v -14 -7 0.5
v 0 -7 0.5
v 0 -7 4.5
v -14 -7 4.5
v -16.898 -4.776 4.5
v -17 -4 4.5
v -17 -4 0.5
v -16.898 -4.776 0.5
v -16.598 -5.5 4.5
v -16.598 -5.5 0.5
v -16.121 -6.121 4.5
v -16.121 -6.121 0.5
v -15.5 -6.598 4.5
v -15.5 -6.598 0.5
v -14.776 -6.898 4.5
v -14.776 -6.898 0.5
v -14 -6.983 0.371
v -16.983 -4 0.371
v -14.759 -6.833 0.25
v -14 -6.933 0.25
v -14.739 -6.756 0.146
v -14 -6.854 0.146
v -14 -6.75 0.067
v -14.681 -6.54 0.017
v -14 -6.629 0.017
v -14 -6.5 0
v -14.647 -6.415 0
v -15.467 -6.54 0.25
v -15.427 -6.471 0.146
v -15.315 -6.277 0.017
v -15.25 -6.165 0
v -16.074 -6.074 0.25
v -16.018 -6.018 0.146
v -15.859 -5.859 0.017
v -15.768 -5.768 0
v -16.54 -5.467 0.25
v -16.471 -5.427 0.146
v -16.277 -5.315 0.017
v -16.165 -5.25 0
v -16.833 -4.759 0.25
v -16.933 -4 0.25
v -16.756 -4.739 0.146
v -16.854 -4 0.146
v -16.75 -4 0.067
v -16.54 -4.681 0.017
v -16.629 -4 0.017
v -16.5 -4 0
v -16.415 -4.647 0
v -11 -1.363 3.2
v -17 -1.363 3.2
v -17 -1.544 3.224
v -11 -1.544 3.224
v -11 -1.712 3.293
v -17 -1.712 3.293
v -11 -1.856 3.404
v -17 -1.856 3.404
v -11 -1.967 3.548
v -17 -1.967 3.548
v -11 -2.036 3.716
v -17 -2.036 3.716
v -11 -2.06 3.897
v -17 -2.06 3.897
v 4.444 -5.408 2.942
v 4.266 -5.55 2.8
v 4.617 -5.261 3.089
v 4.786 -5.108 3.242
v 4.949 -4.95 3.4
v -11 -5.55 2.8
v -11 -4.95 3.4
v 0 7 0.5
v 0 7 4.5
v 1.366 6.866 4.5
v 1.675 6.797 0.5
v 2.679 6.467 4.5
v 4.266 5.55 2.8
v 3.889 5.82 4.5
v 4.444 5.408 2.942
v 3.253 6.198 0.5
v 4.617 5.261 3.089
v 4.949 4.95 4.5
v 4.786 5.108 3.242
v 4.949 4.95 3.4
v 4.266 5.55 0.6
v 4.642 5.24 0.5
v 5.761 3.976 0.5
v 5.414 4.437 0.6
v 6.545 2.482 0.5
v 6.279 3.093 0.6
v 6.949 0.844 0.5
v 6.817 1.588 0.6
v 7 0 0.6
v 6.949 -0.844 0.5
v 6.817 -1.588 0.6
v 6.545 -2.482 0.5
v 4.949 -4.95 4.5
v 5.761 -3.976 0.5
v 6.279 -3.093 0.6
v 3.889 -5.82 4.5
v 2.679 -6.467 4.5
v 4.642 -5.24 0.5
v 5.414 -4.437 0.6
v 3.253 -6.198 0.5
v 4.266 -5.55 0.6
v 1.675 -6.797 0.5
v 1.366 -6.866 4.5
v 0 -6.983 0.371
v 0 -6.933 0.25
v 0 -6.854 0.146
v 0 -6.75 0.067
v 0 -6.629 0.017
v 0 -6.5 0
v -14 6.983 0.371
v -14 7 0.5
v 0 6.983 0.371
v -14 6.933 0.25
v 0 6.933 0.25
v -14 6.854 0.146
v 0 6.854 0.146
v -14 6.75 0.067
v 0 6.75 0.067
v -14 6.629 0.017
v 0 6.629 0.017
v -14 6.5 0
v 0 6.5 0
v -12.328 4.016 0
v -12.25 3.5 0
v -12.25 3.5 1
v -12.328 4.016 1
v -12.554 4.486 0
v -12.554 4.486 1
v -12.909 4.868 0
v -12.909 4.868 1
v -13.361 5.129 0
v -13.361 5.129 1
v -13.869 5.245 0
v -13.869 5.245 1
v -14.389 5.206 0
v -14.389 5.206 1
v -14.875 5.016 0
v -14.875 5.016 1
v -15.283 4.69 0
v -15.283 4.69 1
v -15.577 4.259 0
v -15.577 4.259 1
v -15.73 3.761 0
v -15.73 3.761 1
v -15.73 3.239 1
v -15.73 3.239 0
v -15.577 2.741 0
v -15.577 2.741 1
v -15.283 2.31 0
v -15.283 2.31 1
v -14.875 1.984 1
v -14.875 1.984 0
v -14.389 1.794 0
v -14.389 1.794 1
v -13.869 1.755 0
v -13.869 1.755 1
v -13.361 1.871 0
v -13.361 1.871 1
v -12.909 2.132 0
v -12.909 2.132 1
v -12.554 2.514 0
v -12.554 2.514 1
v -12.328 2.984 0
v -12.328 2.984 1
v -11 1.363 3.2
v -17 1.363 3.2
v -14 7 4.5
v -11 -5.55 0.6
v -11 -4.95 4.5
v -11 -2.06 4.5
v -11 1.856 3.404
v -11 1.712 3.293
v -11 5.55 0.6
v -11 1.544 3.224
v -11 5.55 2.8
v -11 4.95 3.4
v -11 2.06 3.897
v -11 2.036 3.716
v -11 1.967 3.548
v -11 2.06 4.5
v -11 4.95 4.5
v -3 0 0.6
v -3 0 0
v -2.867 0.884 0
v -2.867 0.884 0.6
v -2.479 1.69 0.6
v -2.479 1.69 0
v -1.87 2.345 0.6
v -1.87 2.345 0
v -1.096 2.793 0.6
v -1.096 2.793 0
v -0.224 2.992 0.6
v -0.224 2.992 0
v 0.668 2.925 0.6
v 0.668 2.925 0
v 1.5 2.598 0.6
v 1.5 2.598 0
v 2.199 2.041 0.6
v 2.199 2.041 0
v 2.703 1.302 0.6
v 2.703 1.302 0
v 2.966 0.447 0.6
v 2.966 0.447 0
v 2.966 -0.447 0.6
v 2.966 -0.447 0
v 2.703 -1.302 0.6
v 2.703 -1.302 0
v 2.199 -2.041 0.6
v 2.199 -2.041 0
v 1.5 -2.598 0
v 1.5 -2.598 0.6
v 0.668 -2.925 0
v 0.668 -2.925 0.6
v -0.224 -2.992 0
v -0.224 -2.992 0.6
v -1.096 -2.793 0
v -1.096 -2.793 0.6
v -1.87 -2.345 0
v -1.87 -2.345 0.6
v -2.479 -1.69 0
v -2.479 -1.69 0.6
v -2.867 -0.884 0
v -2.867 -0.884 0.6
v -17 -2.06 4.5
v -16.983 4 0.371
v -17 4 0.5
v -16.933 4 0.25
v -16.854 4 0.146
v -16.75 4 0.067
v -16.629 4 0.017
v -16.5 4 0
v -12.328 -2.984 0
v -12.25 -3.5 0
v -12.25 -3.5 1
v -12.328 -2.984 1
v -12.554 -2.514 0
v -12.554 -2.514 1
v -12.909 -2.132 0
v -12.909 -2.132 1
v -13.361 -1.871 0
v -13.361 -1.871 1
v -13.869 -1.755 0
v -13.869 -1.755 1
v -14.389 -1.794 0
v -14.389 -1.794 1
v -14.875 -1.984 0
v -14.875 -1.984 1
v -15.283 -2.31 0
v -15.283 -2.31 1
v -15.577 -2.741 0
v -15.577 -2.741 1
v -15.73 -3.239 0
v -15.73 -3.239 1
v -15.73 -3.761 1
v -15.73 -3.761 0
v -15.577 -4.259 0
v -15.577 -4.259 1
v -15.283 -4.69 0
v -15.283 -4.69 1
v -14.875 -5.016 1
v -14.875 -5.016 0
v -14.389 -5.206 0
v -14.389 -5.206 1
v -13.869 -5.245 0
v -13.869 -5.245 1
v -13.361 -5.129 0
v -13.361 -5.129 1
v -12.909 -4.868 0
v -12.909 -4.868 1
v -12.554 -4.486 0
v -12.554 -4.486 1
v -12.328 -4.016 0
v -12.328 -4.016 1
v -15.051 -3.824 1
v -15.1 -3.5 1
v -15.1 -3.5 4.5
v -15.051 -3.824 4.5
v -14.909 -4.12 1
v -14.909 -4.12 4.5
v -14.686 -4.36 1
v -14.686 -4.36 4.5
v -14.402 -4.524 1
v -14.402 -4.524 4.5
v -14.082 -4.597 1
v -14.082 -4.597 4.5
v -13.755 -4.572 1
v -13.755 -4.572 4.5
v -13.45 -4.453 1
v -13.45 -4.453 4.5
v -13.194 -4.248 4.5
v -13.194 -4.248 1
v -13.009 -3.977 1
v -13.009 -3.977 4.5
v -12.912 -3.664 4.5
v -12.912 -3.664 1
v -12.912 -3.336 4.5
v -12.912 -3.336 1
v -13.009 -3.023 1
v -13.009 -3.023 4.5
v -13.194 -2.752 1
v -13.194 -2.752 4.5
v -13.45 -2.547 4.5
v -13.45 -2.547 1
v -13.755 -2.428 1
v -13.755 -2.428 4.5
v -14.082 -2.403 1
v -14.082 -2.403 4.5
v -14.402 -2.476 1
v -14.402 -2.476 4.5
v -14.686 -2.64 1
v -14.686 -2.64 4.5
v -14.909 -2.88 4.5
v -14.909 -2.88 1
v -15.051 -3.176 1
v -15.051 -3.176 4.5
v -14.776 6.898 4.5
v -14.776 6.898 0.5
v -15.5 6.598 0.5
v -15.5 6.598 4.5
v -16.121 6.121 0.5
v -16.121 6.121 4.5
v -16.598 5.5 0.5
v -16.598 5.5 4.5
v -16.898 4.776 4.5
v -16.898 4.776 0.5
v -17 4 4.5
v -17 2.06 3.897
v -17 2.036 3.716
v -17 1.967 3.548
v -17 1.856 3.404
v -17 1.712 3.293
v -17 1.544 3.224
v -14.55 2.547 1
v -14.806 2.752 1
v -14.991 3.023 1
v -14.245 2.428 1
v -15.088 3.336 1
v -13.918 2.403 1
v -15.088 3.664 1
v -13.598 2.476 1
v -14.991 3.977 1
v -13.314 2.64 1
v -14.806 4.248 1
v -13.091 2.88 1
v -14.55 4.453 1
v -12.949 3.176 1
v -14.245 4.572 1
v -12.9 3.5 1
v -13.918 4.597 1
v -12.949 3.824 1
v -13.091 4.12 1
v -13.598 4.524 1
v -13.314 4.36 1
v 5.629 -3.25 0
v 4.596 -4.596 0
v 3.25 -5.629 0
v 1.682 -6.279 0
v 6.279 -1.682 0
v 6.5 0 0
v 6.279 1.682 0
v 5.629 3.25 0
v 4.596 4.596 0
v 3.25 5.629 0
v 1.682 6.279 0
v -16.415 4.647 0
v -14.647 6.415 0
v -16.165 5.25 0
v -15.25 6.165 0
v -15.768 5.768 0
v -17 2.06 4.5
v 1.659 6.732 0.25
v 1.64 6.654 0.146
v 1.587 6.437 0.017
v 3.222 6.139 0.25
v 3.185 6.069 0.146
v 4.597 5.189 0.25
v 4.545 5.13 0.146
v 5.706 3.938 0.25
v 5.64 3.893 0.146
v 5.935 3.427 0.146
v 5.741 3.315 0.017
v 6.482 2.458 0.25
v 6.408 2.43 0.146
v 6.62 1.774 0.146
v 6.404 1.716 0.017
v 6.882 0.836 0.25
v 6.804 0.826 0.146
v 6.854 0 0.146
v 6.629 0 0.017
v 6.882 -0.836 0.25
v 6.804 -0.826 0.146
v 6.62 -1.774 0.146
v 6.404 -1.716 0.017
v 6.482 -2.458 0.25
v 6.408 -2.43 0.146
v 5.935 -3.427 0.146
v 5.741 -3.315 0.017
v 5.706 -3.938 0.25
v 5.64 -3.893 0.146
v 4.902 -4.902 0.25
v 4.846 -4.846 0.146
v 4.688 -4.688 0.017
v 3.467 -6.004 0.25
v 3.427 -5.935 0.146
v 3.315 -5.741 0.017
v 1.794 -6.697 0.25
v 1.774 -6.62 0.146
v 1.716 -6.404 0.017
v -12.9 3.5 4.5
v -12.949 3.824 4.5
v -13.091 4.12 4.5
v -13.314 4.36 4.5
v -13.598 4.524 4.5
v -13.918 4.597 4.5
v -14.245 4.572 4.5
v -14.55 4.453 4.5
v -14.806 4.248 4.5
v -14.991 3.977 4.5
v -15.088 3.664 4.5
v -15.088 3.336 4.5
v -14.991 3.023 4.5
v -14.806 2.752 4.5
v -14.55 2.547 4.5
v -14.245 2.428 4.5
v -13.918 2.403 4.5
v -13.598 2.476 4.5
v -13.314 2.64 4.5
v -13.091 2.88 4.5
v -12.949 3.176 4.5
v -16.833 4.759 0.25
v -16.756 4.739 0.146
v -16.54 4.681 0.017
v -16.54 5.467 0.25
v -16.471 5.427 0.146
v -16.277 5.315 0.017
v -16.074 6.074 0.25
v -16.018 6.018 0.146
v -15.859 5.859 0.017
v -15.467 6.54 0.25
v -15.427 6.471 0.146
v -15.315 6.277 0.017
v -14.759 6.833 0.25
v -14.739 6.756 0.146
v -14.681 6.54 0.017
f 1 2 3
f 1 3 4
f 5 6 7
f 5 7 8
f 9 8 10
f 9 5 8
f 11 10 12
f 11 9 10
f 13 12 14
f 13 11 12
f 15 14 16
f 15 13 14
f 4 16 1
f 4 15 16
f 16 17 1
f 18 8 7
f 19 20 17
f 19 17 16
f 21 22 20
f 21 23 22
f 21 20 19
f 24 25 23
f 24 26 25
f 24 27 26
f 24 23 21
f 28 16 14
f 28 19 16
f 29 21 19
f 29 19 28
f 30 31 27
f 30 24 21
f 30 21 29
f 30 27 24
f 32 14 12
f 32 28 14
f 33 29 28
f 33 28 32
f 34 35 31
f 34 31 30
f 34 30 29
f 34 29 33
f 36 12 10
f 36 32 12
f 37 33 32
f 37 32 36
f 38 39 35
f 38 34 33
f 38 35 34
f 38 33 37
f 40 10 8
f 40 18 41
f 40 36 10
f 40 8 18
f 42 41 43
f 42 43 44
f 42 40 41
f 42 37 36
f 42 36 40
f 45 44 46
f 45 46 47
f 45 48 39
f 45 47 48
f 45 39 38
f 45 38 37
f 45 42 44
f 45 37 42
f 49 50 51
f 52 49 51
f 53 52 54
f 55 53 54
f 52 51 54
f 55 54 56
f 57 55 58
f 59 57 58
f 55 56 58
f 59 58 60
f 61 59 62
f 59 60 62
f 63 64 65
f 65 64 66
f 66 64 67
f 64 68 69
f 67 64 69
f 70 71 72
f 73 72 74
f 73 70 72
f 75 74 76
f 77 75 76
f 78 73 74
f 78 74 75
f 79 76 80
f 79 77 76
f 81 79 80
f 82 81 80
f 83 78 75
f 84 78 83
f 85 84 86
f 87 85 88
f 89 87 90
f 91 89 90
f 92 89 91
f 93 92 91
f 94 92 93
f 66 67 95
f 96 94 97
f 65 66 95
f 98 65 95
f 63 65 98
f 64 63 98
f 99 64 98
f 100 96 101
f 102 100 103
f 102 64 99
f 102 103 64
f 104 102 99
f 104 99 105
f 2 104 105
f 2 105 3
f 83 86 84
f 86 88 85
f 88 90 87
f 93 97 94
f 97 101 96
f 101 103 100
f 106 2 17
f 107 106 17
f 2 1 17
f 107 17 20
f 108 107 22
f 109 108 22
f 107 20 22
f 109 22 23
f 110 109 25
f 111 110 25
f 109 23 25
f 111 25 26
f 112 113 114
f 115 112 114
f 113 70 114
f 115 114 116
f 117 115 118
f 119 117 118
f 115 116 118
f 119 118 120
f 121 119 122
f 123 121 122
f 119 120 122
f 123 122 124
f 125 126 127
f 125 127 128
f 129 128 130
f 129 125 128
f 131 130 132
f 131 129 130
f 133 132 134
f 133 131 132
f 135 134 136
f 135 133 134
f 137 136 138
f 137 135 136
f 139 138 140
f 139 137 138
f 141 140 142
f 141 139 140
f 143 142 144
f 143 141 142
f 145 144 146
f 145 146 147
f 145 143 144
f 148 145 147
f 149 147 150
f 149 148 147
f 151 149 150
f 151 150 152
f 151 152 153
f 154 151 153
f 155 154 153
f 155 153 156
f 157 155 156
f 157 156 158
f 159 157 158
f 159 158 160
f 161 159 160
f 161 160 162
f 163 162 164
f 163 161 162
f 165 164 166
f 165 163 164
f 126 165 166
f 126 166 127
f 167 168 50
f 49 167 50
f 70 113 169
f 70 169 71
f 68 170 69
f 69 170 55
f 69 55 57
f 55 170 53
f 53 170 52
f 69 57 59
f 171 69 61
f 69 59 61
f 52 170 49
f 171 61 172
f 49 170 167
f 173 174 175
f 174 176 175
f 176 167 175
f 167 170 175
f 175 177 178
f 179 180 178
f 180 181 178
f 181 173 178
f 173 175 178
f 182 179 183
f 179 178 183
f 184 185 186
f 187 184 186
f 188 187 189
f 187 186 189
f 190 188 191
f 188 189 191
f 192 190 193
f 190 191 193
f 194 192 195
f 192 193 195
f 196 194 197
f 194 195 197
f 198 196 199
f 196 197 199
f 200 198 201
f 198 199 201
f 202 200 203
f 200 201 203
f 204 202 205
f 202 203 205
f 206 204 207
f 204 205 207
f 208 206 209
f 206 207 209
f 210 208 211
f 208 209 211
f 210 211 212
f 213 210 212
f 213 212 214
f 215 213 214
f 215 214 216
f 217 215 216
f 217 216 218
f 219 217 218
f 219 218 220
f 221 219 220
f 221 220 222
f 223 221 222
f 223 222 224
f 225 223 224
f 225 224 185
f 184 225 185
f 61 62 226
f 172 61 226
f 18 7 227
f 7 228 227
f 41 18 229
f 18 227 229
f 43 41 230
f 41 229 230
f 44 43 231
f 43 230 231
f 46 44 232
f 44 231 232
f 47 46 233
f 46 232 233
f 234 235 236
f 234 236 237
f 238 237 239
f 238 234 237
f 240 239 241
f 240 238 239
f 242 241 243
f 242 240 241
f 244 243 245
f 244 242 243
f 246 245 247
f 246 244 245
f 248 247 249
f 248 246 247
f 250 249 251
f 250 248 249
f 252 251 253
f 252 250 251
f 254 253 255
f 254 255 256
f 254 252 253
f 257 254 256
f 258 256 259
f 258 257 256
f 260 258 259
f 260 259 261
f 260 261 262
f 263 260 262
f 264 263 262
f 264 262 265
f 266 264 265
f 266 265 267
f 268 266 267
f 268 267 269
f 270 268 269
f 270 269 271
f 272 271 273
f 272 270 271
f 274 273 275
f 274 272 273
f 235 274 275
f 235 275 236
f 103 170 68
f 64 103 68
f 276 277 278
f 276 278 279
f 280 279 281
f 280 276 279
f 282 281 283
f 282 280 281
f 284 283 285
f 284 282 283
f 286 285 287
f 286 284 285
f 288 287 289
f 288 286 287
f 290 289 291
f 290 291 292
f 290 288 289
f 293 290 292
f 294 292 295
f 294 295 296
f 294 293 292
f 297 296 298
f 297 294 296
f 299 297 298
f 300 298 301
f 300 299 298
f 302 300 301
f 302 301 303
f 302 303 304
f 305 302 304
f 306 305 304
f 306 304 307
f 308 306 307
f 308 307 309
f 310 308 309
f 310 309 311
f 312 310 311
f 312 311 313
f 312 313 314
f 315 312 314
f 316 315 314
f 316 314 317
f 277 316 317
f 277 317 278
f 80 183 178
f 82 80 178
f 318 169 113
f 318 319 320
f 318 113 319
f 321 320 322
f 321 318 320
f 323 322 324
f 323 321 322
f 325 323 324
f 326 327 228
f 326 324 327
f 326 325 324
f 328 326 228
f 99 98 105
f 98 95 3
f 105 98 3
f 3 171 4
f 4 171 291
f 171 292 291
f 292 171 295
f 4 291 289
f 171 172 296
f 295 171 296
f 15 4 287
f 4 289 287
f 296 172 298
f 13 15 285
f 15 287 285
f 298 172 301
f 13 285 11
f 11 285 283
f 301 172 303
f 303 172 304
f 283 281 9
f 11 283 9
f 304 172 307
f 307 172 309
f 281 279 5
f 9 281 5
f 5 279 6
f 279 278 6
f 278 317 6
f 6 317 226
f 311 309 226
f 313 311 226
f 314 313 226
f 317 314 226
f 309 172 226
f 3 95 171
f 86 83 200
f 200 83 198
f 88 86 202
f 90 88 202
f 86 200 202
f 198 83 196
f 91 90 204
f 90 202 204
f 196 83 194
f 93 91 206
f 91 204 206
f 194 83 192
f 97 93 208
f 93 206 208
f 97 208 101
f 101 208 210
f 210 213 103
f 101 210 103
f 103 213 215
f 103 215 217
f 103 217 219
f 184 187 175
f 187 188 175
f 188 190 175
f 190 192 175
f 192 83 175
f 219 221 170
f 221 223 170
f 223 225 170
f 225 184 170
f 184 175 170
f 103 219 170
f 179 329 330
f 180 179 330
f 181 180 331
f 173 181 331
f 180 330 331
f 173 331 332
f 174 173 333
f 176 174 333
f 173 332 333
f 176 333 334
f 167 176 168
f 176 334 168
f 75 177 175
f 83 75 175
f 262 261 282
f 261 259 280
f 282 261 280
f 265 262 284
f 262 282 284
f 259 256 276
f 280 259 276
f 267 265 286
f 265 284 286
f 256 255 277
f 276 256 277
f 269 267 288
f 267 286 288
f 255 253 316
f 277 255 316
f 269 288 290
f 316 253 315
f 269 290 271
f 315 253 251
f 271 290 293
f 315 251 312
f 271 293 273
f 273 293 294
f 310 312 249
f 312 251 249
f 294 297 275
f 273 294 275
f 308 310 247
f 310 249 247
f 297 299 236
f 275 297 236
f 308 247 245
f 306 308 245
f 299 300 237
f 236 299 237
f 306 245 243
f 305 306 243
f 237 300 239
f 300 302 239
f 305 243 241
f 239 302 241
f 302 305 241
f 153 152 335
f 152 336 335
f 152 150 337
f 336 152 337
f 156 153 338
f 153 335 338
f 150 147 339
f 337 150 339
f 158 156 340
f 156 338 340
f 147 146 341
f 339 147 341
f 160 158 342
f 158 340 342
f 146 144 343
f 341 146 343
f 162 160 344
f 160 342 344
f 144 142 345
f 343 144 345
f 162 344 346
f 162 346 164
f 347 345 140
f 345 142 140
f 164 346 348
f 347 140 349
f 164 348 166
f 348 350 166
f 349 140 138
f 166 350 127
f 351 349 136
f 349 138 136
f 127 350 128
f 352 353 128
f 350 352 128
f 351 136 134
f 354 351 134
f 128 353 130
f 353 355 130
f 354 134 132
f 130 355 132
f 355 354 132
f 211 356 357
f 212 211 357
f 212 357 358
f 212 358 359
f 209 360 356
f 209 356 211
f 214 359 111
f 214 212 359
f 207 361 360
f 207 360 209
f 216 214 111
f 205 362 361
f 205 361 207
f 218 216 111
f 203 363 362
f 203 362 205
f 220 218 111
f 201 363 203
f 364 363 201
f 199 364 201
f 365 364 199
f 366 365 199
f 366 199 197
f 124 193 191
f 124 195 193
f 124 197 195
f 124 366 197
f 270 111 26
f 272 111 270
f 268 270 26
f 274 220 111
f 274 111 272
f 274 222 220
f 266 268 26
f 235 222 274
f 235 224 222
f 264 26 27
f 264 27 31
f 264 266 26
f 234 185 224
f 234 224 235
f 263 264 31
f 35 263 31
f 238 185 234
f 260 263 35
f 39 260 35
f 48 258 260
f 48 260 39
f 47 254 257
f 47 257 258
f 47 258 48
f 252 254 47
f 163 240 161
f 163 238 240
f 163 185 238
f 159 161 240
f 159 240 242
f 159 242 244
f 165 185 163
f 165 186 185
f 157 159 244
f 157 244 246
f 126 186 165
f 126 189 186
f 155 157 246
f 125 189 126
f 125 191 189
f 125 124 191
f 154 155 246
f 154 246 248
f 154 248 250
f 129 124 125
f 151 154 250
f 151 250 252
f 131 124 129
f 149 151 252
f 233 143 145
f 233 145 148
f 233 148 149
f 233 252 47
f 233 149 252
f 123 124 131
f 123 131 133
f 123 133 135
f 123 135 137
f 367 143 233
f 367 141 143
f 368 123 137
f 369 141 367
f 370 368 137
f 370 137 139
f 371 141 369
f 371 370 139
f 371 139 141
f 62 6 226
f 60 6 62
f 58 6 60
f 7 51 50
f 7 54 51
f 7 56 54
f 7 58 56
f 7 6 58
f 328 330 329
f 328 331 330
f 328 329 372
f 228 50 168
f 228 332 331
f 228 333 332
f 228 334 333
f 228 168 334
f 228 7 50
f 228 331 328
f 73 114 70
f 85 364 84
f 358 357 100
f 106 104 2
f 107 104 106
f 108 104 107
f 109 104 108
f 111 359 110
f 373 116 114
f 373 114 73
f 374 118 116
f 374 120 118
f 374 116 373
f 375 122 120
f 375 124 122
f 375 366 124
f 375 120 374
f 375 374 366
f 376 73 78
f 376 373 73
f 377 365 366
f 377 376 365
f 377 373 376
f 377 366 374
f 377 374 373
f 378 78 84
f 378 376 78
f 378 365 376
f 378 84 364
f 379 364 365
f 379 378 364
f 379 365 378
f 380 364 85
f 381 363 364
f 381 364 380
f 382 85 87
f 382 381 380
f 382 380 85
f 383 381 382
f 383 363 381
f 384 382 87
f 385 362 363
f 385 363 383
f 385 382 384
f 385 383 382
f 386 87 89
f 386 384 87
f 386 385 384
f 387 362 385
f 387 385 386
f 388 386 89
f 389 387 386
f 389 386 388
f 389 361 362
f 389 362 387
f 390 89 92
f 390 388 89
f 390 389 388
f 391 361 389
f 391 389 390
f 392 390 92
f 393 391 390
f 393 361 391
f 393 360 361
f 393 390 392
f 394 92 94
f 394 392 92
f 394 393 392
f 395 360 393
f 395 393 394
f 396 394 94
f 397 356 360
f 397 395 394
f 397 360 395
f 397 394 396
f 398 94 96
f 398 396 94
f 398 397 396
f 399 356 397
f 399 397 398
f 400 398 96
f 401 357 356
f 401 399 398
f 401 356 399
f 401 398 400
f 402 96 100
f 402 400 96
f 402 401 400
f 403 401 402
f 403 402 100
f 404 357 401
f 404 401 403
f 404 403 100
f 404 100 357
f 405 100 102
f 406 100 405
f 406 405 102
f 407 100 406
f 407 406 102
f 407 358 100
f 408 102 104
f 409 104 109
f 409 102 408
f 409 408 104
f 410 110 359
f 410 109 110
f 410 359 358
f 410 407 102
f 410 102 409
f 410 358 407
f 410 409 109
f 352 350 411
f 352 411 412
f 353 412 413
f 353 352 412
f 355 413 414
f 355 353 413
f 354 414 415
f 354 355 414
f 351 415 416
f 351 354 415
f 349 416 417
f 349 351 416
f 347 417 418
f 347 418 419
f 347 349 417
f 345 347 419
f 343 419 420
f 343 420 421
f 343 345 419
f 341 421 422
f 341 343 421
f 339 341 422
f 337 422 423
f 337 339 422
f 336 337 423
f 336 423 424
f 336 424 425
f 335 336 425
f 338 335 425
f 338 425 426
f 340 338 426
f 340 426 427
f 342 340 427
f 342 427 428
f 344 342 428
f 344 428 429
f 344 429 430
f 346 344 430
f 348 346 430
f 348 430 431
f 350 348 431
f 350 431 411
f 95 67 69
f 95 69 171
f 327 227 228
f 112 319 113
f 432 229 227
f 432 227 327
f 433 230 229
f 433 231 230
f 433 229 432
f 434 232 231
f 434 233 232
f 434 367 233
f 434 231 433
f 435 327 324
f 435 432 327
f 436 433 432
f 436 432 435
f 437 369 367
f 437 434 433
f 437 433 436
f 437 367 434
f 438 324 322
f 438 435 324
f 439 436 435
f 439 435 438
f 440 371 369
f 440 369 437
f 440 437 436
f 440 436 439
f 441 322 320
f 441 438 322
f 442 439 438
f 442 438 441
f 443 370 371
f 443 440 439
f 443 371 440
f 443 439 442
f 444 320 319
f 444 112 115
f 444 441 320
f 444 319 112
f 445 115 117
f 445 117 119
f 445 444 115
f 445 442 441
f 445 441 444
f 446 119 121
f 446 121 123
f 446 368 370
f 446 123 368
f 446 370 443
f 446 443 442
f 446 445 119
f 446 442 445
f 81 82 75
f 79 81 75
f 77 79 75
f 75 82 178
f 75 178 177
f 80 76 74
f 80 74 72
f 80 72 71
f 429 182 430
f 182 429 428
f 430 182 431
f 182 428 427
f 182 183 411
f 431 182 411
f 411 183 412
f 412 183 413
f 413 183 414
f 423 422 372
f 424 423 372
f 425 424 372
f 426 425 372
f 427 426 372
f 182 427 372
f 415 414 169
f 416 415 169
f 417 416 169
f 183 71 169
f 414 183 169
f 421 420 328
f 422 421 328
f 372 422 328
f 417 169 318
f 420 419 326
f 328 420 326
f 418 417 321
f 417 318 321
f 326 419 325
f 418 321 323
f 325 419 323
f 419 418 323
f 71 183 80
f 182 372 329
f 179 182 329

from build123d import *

# Parameters (mm, degrees)
SKETCH1_R           = 1.1
BOSS_EXTRUDE1_DEPTH = 4.5
SKETCH2_R           = 3
CUT_EXTRUDE2_DEPTH  = 10
CUT_EXTRUDE4_START  = -6
CUT_EXTRUDE4_DEPTH  = 20.401771592
CUT_EXTRUDE6_DEPTH  = 26.401771592
FILLET4_R           = 3
FILLET1_R           = 0.5
SKETCH5_R           = 1.75
CUT_EXTRUDE5_DEPTH  = 1


with BuildPart() as part:
    # Sketch1 → Boss-Extrude1 (new body)
    with BuildSketch(Plane.XY):
        with BuildLine():
            Line((-17, 7), (0, 7))
            ThreePointArc((0, 7), (7, 0), (0, -7))
            Line((0, -7), (-17, -7))
            Line((-17, -7), (-17, 7))
        make_face()
        with Locations((-14, 3.5)):
            Circle(SKETCH1_R, mode=Mode.SUBTRACT)
        with Locations(Location((-14, -3.5, 0), (0, 0, 180))):
            Circle(SKETCH1_R, mode=Mode.SUBTRACT)
    extrude(amount=BOSS_EXTRUDE1_DEPTH)

    # Sketch2 → Cut-Extrude2 (cut)
    with BuildSketch(Plane(origin=(0, 0, 0), x_dir=(-1, 0, 0), z_dir=(0, 0, -1))):
        Circle(SKETCH2_R)
    extrude(amount=-CUT_EXTRUDE2_DEPTH, mode=Mode.SUBTRACT)

    # Sketch7 → Cut-Extrude4 (cut, through all)
    with BuildSketch(Plane.ZY.offset(17).offset(CUT_EXTRUDE4_START)):
        Polygon((2.8, 5.55), (0.6, 5.55), (0.6, 0), (4.5, 0), (4.5, 4.95), (3.4, 4.95), align=None)
        Polygon((4.5, 0), (0.6, 0), (0.6, -5.55), (2.8, -5.55), (3.4, -4.95), (4.5, -4.95), align=None)
    extrude(amount=-CUT_EXTRUDE4_DEPTH, mode=Mode.SUBTRACT)

    # Sketch8 → Cut-Extrude6 (cut, through all)
    with BuildSketch(Plane.ZY.offset(17)):
        with BuildLine():
            Line((3.2, 1.363340016), (3.2, -1.363340016))
            ThreePointArc((3.2, -1.363340016), (3.404046985, -1.855953015), (3.896659984, -2.06))
            Line((3.896659984, -2.06), (4.5, -2.06))
            Line((4.5, -2.06), (4.5, 2.06))
            Line((4.5, 2.06), (3.896659984, 2.06))
            ThreePointArc((3.896659984, 2.06), (3.404046985, 1.855953015), (3.2, 1.363340016))
        make_face()
    extrude(amount=-CUT_EXTRUDE6_DEPTH, mode=Mode.SUBTRACT)

    # Fillet4
    fillet4_edges = [part.edges().sort_by_distance(p)[0] for p in [
        (-17, -7, 2.25),
        (-17, 7, 2.25),
    ]]
    fillet(fillet4_edges, radius=FILLET4_R)

    # Fillet1
    fillet1_edges = [part.edges().sort_by_distance(p)[0] for p in [
        (-7, 7, 0),
        (7, 0, 0),
        (-17, 0, 0),
        (-7, -7, 0),
        (-16.121320344, -6.121320344, 0),
        (-16.121320344, 6.121320344, 0),
    ]]
    fillet(fillet1_edges, radius=FILLET1_R)

    # Sketch5 → Cut-Extrude5 (cut)
    with BuildSketch(Plane.XY):
        with Locations((-14, 3.5)):
            Circle(SKETCH5_R)
        with Locations((-14, -3.5)):
            Circle(SKETCH5_R)
    extrude(amount=CUT_EXTRUDE5_DEPTH, mode=Mode.SUBTRACT)


solid = part.part
